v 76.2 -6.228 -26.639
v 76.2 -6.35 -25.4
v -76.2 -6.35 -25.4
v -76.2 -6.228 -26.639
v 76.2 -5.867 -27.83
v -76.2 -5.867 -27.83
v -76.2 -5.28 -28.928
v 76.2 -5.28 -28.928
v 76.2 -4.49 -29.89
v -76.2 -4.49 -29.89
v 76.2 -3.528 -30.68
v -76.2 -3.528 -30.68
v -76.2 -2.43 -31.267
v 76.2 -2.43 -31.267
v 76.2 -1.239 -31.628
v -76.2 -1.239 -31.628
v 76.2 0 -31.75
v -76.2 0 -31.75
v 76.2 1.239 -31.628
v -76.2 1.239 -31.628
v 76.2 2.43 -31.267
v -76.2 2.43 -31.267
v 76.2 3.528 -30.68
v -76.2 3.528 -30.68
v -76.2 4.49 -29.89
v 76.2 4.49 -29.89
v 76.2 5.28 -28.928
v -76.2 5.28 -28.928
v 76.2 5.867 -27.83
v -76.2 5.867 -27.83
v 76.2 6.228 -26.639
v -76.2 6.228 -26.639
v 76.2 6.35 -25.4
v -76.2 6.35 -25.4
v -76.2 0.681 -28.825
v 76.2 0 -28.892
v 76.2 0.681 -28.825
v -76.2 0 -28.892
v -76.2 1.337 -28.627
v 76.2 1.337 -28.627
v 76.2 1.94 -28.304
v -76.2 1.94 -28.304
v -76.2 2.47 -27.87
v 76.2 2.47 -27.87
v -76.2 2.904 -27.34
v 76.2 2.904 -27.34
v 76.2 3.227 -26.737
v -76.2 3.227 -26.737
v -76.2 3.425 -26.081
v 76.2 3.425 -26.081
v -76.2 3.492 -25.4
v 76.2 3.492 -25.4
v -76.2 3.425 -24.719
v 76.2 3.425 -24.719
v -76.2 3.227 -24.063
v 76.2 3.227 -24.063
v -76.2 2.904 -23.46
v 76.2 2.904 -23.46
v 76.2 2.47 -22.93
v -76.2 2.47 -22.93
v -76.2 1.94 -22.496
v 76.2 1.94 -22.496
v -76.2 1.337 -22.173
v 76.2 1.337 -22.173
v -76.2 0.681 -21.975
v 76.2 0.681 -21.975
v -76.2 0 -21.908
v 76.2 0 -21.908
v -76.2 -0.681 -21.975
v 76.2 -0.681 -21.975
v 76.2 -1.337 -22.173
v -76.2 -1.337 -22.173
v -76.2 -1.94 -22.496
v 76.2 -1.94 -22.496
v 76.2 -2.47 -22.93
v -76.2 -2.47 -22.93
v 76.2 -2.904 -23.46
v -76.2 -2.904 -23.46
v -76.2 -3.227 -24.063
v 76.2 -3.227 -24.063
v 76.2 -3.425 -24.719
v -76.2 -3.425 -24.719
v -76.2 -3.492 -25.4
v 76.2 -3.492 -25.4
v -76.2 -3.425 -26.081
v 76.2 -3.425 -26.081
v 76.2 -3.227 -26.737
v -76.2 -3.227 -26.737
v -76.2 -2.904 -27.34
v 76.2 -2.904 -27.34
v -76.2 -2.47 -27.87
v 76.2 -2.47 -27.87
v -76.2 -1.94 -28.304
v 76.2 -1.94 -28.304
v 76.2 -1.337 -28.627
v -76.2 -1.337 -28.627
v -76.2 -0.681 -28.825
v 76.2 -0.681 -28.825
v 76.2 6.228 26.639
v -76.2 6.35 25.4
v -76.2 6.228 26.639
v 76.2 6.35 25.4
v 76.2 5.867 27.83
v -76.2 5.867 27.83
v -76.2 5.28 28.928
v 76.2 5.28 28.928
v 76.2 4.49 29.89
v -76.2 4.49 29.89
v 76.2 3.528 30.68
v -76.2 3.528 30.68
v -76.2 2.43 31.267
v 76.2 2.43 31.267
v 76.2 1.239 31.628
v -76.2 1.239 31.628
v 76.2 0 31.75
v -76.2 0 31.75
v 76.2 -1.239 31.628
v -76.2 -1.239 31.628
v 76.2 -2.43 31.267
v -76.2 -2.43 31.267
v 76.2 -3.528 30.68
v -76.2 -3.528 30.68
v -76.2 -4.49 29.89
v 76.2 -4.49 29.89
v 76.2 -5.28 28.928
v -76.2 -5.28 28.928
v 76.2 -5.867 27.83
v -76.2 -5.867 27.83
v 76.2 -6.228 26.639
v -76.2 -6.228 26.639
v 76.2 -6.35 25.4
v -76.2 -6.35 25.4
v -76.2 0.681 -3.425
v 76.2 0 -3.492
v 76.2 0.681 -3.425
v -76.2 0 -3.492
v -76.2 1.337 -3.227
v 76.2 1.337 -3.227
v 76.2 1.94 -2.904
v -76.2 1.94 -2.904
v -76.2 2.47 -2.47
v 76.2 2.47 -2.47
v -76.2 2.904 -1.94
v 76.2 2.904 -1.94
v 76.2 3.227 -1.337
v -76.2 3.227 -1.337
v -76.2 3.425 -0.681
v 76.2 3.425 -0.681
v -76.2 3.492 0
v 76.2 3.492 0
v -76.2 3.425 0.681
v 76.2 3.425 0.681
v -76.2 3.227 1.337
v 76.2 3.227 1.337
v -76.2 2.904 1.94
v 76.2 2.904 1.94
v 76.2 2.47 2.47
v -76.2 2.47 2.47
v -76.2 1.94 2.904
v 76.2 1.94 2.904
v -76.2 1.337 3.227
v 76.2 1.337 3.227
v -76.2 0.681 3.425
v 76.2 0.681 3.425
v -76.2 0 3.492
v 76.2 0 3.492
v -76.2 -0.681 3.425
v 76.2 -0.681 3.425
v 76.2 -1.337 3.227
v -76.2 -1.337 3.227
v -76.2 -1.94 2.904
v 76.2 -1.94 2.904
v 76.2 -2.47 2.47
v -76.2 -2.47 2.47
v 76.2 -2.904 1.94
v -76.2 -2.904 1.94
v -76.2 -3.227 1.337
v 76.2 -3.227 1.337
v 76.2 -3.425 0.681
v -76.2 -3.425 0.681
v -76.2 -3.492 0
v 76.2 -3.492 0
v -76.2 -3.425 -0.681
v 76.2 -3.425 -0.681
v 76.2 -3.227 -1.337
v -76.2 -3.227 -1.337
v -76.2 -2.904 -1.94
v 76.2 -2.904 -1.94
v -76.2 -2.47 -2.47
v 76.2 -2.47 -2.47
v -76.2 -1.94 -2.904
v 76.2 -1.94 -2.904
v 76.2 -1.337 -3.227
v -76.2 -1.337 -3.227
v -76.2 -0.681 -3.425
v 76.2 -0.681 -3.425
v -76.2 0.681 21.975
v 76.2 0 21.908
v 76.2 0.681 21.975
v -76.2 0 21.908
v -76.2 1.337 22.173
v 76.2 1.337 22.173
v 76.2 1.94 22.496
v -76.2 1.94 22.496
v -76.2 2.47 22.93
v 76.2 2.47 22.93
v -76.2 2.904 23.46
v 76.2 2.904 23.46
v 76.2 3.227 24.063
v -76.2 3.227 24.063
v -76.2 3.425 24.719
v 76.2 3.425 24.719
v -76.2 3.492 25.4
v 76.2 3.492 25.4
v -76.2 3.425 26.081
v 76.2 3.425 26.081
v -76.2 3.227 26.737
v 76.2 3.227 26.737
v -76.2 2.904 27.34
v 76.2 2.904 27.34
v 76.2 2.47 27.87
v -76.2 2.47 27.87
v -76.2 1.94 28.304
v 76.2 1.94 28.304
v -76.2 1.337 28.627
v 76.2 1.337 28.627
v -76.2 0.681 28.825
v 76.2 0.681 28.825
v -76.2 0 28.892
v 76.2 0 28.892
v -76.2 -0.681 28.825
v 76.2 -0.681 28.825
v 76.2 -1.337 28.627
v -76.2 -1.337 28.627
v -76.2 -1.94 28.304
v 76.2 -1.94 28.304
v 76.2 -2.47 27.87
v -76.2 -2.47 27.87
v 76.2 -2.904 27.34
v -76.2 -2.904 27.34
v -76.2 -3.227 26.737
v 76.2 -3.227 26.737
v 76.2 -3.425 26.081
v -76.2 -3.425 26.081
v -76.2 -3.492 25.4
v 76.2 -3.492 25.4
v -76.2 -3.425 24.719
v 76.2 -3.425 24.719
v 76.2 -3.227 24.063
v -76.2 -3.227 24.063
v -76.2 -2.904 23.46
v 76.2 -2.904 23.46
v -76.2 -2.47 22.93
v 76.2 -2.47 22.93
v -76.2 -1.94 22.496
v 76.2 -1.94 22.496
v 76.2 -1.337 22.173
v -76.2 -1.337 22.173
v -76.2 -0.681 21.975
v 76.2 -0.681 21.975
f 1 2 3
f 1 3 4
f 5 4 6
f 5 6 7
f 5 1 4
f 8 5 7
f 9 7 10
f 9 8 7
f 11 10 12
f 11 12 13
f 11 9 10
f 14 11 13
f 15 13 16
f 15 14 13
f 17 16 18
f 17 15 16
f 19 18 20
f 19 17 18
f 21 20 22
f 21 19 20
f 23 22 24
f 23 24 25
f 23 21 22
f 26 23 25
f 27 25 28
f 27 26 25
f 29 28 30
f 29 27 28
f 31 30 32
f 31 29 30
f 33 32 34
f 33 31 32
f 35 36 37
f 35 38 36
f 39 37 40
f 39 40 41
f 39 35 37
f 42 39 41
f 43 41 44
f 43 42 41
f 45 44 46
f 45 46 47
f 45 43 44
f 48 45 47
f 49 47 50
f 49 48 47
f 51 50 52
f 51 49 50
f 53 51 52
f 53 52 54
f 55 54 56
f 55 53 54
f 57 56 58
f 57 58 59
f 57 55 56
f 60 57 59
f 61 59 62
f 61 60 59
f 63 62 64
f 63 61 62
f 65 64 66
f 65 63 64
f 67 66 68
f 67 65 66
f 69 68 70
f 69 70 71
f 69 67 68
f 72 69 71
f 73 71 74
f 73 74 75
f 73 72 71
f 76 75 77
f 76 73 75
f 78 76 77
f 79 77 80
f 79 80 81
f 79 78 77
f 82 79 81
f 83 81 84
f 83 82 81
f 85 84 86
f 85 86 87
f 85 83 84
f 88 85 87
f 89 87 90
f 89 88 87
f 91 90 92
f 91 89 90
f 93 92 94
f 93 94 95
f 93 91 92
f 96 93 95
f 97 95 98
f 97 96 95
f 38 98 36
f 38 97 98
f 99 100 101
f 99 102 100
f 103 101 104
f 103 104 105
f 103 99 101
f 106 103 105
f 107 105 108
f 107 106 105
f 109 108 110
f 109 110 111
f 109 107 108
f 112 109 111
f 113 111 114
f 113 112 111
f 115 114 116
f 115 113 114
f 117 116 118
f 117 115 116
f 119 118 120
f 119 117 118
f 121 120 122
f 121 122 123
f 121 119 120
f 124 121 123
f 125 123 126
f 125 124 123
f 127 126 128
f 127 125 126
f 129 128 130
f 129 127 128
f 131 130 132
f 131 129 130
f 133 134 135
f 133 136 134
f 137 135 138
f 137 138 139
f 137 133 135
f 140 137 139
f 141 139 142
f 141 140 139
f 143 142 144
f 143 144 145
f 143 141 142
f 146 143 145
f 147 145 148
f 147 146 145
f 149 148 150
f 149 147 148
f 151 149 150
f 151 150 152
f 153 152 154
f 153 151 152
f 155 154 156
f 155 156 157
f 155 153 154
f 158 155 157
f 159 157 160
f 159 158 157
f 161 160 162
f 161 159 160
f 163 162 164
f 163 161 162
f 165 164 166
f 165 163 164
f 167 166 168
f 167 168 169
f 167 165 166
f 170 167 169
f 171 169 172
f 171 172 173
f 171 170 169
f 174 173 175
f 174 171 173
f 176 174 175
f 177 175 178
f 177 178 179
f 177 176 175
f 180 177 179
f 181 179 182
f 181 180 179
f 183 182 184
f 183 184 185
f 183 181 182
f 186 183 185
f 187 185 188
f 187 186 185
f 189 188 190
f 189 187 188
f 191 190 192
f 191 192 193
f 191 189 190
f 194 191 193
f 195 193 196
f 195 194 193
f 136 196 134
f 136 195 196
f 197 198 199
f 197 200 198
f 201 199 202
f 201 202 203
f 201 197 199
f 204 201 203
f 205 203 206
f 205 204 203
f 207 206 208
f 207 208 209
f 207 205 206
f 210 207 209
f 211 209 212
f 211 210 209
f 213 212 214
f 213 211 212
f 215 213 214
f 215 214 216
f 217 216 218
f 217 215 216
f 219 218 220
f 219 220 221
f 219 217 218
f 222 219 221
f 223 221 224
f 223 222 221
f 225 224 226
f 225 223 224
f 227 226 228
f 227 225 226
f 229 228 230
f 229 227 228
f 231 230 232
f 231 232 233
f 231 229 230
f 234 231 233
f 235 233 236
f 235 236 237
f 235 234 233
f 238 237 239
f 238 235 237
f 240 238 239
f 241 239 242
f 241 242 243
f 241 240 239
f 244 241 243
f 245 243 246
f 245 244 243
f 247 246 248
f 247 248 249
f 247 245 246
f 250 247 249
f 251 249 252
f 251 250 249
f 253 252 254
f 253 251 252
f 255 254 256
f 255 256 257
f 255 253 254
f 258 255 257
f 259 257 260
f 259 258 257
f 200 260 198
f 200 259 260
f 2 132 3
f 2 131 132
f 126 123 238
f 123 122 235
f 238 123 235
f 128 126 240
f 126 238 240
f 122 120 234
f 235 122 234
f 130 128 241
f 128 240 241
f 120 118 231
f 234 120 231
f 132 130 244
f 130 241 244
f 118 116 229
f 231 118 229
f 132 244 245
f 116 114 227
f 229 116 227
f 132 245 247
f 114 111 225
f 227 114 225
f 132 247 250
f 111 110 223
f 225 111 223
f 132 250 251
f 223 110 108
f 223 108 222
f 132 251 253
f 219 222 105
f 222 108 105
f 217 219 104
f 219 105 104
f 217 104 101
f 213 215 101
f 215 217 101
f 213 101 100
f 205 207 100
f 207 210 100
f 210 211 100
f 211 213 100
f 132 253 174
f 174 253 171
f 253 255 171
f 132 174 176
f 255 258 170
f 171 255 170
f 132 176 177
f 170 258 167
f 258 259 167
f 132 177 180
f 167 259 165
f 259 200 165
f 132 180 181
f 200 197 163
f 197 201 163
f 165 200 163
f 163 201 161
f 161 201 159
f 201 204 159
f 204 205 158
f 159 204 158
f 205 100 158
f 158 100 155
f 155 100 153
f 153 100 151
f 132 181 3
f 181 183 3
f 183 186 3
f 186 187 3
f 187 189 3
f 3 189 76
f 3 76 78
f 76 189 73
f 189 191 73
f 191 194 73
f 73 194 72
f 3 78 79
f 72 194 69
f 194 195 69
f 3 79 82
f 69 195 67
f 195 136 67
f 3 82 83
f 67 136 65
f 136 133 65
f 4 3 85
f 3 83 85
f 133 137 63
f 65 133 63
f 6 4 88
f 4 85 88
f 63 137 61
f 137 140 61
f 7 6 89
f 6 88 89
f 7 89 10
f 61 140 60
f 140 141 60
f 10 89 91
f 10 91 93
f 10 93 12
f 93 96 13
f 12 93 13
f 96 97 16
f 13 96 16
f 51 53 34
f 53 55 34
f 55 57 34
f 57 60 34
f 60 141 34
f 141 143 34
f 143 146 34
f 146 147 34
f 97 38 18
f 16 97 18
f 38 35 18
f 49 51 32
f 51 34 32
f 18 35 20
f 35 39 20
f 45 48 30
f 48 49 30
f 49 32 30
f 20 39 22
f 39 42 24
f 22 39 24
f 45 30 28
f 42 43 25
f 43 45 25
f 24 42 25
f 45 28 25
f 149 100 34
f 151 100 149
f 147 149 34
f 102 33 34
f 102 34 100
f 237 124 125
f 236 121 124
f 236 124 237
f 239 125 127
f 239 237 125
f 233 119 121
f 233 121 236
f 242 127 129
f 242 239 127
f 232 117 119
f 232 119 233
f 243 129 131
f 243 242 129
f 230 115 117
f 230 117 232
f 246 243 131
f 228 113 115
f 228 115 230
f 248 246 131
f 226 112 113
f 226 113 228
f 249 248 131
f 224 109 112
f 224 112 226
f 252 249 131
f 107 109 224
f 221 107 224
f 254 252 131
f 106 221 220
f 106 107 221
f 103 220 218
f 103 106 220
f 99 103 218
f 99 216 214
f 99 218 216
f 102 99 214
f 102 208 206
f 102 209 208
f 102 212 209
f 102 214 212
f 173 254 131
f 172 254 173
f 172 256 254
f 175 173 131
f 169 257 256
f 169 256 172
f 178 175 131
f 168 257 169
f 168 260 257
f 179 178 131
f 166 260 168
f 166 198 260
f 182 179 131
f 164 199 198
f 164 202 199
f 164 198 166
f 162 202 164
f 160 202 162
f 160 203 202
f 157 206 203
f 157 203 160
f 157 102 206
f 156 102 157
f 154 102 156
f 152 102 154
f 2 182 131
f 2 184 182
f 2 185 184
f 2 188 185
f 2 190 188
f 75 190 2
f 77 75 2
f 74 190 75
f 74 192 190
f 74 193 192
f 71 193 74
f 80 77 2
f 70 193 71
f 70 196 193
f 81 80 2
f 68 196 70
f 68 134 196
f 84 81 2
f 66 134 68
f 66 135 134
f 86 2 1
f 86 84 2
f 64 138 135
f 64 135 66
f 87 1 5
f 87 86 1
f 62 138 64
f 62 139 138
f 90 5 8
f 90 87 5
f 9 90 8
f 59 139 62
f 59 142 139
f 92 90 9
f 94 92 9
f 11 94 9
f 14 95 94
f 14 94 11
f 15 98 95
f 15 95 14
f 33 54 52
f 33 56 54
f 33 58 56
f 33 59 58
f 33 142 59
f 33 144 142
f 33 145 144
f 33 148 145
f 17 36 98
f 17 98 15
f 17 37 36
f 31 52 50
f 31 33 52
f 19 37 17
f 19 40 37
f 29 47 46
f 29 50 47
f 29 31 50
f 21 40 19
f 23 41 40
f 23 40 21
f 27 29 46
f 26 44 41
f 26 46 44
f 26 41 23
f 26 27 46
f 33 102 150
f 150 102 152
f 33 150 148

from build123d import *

# Parameters (mm, degrees)
SKETCH1_R           = 3.4925
BOSS_EXTRUDE1_DEPTH = 76.2


with BuildPart() as part:
    # Sketch1 → Boss-Extrude1 (new body, symmetric)
    with BuildSketch(Plane(origin=(0, 0, 0), x_dir=(0, 0, -1), z_dir=(1, 0, 0))):
        with BuildLine():
            Line((-25.4, -6.35), (25.4, -6.35))
            ThreePointArc((25.4, -6.35), (31.75, 0), (25.4, 6.35))
            Line((25.4, 6.35), (-25.4, 6.35))
            ThreePointArc((-25.4, 6.35), (-31.75, 0), (-25.4, -6.35))
        make_face()
        with Locations((-25.4, 0)):
            Circle(SKETCH1_R, mode=Mode.SUBTRACT)
        with Locations((25.4, 0)):
            Circle(SKETCH1_R, mode=Mode.SUBTRACT)
        Circle(SKETCH1_R, mode=Mode.SUBTRACT)
    extrude(amount=BOSS_EXTRUDE1_DEPTH, both=True)


solid = part.part
